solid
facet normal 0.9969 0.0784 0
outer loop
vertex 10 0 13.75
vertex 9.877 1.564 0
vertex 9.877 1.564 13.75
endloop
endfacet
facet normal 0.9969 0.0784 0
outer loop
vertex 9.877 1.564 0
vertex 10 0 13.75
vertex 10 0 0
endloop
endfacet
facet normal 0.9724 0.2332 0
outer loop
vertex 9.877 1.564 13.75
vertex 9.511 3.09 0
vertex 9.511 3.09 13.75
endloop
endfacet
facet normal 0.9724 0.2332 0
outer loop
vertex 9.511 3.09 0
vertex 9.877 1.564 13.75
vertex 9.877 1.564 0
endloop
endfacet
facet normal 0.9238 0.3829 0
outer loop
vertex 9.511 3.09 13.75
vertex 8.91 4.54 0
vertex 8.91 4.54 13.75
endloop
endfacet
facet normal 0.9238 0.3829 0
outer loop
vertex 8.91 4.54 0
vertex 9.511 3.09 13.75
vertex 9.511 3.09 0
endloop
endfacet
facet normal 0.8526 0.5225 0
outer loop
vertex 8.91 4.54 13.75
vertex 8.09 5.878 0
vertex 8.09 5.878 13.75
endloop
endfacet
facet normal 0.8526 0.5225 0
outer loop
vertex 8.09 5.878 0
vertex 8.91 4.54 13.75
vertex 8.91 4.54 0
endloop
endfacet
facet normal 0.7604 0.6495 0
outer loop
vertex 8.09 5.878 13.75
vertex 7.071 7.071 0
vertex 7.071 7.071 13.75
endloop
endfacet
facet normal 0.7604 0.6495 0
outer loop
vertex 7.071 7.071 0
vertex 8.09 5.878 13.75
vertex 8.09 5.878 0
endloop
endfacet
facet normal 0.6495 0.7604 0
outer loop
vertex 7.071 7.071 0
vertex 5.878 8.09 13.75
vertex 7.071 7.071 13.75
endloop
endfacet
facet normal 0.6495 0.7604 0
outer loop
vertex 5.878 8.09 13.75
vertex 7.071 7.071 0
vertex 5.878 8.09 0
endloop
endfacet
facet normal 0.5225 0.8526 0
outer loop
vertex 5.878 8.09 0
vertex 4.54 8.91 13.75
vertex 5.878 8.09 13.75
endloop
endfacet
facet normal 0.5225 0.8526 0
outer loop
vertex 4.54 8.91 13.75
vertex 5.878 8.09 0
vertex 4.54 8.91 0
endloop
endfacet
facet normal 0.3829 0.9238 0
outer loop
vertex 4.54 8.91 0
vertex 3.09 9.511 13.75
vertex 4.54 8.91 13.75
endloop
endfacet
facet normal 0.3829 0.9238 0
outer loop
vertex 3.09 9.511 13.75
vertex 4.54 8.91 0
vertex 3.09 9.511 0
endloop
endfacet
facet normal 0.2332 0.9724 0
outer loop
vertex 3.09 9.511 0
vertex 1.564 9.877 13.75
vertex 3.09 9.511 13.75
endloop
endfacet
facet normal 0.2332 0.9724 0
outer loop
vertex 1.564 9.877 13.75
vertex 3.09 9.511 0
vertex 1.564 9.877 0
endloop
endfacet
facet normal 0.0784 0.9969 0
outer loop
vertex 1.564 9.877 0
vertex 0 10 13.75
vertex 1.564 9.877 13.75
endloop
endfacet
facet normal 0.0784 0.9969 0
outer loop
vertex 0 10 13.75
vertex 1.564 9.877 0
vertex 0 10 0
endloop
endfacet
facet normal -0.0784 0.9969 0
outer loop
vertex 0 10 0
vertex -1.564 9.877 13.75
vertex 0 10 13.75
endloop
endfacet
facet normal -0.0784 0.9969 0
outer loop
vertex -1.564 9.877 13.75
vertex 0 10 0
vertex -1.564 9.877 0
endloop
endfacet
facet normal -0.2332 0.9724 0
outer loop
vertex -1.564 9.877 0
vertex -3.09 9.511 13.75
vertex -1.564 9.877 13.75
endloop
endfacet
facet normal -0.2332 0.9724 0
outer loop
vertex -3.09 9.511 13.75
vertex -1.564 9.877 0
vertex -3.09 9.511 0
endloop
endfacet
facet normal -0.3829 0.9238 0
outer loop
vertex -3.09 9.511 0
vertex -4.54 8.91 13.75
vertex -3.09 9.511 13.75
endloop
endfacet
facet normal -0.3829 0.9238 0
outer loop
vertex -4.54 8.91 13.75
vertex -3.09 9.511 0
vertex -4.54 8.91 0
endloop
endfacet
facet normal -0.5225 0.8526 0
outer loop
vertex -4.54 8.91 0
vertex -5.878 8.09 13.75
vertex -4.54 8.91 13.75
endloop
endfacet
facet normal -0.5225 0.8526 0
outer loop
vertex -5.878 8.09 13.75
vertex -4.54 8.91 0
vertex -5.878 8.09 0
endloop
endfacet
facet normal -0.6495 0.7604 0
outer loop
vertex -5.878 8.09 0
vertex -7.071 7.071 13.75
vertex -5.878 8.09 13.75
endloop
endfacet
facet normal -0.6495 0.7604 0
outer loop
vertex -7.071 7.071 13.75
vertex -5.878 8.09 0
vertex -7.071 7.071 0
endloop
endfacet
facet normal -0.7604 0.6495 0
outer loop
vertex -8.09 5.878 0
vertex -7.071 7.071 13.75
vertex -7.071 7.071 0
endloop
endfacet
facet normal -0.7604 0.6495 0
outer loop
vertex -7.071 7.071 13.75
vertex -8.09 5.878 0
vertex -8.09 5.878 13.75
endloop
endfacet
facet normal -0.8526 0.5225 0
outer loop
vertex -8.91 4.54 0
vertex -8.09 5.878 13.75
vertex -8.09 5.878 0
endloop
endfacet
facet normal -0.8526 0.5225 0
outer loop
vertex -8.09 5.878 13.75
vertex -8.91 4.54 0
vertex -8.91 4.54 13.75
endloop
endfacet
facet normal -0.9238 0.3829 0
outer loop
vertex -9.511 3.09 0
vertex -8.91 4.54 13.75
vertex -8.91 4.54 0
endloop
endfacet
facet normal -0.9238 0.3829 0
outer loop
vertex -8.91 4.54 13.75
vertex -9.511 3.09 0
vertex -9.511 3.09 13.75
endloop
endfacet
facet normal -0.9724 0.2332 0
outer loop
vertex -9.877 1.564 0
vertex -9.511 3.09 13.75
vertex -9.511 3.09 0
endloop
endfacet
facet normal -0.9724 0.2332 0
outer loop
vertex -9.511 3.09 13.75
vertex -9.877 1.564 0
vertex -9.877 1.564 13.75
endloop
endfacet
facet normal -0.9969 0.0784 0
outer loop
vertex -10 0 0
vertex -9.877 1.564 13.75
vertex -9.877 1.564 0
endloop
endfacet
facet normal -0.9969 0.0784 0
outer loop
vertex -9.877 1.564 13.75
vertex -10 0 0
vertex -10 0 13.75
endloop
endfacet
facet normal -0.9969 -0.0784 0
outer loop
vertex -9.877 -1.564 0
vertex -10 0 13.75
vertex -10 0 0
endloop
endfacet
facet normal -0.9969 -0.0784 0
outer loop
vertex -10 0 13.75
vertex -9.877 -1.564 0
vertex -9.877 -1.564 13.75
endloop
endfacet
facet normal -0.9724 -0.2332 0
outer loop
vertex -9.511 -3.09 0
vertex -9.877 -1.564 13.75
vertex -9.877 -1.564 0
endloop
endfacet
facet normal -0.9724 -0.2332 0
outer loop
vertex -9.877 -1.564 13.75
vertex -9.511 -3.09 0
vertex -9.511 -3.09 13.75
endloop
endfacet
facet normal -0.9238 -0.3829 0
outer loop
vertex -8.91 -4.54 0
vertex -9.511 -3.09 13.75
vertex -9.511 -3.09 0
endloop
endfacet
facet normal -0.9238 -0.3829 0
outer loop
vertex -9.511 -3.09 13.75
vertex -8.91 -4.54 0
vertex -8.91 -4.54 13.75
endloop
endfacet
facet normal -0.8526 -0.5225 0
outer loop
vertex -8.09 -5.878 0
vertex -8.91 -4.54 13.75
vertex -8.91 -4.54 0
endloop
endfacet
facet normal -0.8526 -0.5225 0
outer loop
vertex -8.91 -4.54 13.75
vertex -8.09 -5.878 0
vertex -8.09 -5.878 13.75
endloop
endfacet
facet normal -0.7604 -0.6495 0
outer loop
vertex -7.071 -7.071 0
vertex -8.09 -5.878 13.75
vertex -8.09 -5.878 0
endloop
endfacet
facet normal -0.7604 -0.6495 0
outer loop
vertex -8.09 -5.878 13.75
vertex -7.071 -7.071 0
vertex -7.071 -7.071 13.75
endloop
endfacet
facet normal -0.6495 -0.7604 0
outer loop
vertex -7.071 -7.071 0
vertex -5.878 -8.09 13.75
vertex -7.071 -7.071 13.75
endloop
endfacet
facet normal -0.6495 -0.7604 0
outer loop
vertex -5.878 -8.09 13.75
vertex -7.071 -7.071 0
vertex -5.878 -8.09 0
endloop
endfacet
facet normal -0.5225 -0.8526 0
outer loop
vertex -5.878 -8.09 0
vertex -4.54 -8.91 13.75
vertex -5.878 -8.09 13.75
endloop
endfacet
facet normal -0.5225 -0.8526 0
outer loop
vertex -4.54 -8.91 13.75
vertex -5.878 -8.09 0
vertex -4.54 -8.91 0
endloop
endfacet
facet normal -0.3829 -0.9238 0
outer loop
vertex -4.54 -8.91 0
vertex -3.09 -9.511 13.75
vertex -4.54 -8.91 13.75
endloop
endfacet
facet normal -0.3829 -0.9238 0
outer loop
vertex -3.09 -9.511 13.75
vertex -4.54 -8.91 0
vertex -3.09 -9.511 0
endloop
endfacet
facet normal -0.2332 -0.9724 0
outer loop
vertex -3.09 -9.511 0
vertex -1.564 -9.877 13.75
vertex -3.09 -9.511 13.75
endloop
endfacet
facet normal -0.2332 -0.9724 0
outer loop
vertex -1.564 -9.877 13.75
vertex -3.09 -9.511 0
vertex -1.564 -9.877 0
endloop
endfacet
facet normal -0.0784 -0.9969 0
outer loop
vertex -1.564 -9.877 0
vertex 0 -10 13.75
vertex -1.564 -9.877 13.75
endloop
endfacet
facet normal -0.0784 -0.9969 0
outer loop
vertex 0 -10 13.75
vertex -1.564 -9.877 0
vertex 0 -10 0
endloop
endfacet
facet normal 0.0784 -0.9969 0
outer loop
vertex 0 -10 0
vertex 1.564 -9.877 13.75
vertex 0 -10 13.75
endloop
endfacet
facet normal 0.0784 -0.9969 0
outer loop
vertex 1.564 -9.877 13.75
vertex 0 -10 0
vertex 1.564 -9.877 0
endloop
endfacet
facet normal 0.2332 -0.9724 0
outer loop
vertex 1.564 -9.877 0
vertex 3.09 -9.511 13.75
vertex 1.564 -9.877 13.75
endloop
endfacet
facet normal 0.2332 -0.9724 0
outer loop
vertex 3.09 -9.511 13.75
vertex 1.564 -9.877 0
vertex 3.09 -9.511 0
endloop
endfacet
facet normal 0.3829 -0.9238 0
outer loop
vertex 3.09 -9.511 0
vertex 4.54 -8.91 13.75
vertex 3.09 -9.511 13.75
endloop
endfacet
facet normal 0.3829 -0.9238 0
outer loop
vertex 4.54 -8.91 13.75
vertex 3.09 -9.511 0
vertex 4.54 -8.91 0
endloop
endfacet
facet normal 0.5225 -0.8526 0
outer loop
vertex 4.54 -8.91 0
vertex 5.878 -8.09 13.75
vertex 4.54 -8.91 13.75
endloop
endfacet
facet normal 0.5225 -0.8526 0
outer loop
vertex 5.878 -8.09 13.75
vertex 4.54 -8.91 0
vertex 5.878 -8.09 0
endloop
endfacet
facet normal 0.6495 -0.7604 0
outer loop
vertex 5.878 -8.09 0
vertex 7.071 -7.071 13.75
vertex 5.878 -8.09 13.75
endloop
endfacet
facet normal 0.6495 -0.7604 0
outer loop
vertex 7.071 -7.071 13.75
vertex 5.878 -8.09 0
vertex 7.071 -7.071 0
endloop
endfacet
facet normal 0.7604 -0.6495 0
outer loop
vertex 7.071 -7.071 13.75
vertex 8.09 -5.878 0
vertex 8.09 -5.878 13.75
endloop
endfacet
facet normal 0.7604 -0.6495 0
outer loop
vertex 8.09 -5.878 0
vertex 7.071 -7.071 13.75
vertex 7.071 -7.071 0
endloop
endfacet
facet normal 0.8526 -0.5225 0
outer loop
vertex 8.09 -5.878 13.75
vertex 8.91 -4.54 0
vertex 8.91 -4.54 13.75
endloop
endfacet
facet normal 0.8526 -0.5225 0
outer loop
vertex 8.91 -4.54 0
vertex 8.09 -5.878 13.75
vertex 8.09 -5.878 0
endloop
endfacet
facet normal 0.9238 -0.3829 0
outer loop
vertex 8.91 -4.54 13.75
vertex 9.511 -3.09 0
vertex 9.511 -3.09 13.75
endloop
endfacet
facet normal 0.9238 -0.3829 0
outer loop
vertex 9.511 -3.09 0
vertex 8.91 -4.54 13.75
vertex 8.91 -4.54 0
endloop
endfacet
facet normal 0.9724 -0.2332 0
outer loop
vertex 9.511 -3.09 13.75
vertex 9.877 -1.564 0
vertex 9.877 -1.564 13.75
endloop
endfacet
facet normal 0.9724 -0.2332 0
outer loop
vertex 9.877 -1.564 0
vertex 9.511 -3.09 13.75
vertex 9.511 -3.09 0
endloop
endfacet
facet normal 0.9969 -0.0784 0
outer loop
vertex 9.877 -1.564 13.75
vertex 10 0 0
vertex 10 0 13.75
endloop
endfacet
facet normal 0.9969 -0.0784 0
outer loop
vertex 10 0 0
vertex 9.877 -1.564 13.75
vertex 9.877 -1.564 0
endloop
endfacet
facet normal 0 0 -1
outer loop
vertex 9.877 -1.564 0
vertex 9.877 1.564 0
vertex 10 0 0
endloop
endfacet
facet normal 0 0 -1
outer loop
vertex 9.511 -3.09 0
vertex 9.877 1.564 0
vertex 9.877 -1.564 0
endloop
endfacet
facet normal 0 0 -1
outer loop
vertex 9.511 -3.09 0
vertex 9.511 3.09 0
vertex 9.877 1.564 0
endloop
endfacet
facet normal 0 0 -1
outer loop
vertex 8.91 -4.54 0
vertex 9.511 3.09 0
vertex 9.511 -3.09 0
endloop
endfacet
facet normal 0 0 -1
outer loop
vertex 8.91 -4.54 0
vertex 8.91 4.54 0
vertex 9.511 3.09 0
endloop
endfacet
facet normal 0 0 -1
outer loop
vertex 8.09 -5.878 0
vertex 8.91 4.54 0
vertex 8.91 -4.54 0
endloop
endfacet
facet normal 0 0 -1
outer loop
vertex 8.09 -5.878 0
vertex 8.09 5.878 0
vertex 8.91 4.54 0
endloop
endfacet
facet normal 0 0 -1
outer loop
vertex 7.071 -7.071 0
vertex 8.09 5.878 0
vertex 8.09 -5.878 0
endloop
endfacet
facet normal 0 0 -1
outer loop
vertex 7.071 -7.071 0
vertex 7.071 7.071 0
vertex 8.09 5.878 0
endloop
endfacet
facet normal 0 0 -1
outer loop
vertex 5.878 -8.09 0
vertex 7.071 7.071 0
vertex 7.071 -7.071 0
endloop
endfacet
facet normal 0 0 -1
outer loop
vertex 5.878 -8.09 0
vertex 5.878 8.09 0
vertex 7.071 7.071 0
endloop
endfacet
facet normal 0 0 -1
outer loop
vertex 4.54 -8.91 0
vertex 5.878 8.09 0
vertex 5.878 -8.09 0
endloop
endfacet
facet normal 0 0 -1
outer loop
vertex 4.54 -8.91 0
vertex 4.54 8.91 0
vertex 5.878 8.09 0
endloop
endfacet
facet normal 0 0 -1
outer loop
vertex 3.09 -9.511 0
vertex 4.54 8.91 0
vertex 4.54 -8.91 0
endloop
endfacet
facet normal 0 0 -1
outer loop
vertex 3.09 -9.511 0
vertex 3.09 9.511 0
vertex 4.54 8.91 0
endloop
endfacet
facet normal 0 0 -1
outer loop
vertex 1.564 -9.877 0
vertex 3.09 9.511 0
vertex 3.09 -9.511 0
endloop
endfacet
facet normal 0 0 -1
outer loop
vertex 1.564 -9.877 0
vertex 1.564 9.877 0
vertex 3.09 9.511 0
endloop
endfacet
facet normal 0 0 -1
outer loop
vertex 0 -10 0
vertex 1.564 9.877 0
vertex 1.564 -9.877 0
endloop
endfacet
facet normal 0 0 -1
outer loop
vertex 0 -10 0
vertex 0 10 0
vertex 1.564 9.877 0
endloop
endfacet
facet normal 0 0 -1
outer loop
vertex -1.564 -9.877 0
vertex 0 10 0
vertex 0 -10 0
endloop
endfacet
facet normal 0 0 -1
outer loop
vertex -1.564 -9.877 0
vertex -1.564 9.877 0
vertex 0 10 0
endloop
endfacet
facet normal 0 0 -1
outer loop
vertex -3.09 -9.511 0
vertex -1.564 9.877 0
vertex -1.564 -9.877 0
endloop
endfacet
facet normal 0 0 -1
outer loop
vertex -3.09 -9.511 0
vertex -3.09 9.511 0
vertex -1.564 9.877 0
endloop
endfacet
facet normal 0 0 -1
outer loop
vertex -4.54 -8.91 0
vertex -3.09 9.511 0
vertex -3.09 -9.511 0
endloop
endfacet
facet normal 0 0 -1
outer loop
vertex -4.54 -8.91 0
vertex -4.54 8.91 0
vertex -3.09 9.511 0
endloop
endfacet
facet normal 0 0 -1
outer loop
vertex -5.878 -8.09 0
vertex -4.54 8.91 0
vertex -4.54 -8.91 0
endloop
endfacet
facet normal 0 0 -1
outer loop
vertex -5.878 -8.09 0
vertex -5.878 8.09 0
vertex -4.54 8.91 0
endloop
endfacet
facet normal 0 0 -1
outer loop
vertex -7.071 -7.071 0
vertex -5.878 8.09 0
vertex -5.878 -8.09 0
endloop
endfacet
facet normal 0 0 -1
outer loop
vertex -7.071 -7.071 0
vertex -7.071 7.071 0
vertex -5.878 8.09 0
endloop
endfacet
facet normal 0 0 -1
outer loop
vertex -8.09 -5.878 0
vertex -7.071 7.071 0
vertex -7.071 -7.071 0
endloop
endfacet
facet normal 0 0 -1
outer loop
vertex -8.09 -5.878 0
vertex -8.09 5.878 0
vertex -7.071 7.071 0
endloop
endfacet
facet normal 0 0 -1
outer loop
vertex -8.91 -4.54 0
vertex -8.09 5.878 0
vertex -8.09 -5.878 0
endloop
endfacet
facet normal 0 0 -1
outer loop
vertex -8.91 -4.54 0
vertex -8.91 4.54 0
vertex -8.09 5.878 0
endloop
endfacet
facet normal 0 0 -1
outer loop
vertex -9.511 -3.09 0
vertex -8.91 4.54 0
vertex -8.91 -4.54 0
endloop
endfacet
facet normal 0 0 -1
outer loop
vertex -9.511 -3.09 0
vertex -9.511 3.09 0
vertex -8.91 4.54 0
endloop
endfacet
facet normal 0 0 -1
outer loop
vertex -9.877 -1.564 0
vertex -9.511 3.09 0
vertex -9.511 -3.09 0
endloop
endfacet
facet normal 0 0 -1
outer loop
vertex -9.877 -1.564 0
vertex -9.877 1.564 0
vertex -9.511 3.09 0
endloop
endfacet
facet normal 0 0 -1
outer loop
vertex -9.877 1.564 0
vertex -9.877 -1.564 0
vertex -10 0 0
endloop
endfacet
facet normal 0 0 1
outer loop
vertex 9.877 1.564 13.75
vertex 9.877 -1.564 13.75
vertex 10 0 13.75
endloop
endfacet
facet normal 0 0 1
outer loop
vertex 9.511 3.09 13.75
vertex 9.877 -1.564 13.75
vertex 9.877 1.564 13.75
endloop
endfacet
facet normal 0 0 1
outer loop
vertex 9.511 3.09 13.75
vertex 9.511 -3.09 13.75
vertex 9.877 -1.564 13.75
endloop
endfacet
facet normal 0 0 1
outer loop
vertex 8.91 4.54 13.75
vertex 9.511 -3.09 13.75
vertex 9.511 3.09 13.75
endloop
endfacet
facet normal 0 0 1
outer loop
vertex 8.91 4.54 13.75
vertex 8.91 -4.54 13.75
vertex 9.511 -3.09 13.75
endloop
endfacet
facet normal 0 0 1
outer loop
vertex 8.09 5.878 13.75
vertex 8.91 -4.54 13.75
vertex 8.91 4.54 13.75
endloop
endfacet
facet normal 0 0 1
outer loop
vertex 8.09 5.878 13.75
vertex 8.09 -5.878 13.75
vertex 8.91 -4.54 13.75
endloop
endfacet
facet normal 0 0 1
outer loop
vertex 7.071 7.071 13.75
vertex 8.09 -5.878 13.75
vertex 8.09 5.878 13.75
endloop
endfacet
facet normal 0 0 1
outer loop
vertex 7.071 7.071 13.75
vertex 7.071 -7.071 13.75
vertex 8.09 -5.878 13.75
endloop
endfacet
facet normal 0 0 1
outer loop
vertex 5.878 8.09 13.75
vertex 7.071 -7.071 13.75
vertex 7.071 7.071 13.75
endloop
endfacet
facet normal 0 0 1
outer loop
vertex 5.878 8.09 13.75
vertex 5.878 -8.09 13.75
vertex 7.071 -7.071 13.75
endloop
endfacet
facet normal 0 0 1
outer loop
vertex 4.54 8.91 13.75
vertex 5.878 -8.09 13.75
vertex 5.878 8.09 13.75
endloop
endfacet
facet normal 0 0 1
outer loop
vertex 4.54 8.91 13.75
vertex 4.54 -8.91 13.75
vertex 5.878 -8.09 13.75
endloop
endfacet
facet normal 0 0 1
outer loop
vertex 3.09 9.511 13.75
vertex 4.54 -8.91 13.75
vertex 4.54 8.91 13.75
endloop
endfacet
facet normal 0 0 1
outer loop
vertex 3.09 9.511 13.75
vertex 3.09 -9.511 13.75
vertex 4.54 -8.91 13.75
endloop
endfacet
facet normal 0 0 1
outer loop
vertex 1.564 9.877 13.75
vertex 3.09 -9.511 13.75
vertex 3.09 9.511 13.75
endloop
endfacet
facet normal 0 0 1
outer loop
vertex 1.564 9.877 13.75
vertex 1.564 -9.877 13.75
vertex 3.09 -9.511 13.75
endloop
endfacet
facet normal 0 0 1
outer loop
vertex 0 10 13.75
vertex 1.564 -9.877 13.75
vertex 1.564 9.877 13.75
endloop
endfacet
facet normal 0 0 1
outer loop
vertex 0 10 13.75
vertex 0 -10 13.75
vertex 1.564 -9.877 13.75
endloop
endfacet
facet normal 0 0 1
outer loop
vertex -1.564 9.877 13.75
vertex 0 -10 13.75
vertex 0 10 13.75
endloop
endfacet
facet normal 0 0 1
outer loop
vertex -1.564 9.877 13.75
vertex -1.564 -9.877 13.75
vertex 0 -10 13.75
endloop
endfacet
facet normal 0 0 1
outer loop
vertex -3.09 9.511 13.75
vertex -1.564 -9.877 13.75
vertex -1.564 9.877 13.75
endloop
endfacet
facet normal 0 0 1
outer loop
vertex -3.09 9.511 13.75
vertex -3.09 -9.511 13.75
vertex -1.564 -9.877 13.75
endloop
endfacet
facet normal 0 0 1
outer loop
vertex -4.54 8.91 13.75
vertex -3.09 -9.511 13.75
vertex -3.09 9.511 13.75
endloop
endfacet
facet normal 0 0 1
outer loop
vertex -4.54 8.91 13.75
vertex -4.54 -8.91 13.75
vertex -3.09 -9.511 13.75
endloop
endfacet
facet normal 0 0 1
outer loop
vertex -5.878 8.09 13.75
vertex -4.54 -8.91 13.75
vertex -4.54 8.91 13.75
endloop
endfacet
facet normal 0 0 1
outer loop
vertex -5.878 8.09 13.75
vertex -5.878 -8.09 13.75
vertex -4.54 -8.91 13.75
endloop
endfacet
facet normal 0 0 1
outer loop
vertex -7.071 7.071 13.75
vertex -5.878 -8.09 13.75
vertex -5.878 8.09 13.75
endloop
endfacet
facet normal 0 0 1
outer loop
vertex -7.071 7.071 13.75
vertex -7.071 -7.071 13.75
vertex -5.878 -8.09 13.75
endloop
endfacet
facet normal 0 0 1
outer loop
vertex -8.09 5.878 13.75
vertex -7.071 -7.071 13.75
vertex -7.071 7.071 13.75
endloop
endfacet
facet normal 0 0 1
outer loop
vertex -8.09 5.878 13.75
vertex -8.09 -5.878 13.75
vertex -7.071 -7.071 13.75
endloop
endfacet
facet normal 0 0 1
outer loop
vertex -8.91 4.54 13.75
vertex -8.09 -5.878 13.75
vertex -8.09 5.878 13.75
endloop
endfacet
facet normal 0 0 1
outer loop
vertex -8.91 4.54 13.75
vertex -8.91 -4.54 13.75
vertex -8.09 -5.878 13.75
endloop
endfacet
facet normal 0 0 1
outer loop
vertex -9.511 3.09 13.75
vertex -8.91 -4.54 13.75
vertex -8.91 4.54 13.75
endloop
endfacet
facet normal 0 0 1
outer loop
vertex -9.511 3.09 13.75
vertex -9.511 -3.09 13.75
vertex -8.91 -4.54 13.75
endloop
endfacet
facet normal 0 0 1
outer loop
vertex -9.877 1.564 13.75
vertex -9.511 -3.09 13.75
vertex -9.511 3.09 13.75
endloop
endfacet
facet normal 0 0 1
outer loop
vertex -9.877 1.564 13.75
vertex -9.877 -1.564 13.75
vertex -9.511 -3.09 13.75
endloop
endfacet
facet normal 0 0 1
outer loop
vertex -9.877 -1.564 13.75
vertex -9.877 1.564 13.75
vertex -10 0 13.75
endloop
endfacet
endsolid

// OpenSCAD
$fn = 40;

module leg(){
difference(){

hull(){
    cylinder(d=16,h=32.75);
    translate([33,0,0])cylinder(d=8,h=32.75);
    translate([-8,0,0])cube([8,8,32.75]);
    translate([-8,6,0])cylinder(d=4,h=32.75);
    
}
cylinder(d=5.2,h=35);
}
}

cylinder(d=20,h=13.75);
